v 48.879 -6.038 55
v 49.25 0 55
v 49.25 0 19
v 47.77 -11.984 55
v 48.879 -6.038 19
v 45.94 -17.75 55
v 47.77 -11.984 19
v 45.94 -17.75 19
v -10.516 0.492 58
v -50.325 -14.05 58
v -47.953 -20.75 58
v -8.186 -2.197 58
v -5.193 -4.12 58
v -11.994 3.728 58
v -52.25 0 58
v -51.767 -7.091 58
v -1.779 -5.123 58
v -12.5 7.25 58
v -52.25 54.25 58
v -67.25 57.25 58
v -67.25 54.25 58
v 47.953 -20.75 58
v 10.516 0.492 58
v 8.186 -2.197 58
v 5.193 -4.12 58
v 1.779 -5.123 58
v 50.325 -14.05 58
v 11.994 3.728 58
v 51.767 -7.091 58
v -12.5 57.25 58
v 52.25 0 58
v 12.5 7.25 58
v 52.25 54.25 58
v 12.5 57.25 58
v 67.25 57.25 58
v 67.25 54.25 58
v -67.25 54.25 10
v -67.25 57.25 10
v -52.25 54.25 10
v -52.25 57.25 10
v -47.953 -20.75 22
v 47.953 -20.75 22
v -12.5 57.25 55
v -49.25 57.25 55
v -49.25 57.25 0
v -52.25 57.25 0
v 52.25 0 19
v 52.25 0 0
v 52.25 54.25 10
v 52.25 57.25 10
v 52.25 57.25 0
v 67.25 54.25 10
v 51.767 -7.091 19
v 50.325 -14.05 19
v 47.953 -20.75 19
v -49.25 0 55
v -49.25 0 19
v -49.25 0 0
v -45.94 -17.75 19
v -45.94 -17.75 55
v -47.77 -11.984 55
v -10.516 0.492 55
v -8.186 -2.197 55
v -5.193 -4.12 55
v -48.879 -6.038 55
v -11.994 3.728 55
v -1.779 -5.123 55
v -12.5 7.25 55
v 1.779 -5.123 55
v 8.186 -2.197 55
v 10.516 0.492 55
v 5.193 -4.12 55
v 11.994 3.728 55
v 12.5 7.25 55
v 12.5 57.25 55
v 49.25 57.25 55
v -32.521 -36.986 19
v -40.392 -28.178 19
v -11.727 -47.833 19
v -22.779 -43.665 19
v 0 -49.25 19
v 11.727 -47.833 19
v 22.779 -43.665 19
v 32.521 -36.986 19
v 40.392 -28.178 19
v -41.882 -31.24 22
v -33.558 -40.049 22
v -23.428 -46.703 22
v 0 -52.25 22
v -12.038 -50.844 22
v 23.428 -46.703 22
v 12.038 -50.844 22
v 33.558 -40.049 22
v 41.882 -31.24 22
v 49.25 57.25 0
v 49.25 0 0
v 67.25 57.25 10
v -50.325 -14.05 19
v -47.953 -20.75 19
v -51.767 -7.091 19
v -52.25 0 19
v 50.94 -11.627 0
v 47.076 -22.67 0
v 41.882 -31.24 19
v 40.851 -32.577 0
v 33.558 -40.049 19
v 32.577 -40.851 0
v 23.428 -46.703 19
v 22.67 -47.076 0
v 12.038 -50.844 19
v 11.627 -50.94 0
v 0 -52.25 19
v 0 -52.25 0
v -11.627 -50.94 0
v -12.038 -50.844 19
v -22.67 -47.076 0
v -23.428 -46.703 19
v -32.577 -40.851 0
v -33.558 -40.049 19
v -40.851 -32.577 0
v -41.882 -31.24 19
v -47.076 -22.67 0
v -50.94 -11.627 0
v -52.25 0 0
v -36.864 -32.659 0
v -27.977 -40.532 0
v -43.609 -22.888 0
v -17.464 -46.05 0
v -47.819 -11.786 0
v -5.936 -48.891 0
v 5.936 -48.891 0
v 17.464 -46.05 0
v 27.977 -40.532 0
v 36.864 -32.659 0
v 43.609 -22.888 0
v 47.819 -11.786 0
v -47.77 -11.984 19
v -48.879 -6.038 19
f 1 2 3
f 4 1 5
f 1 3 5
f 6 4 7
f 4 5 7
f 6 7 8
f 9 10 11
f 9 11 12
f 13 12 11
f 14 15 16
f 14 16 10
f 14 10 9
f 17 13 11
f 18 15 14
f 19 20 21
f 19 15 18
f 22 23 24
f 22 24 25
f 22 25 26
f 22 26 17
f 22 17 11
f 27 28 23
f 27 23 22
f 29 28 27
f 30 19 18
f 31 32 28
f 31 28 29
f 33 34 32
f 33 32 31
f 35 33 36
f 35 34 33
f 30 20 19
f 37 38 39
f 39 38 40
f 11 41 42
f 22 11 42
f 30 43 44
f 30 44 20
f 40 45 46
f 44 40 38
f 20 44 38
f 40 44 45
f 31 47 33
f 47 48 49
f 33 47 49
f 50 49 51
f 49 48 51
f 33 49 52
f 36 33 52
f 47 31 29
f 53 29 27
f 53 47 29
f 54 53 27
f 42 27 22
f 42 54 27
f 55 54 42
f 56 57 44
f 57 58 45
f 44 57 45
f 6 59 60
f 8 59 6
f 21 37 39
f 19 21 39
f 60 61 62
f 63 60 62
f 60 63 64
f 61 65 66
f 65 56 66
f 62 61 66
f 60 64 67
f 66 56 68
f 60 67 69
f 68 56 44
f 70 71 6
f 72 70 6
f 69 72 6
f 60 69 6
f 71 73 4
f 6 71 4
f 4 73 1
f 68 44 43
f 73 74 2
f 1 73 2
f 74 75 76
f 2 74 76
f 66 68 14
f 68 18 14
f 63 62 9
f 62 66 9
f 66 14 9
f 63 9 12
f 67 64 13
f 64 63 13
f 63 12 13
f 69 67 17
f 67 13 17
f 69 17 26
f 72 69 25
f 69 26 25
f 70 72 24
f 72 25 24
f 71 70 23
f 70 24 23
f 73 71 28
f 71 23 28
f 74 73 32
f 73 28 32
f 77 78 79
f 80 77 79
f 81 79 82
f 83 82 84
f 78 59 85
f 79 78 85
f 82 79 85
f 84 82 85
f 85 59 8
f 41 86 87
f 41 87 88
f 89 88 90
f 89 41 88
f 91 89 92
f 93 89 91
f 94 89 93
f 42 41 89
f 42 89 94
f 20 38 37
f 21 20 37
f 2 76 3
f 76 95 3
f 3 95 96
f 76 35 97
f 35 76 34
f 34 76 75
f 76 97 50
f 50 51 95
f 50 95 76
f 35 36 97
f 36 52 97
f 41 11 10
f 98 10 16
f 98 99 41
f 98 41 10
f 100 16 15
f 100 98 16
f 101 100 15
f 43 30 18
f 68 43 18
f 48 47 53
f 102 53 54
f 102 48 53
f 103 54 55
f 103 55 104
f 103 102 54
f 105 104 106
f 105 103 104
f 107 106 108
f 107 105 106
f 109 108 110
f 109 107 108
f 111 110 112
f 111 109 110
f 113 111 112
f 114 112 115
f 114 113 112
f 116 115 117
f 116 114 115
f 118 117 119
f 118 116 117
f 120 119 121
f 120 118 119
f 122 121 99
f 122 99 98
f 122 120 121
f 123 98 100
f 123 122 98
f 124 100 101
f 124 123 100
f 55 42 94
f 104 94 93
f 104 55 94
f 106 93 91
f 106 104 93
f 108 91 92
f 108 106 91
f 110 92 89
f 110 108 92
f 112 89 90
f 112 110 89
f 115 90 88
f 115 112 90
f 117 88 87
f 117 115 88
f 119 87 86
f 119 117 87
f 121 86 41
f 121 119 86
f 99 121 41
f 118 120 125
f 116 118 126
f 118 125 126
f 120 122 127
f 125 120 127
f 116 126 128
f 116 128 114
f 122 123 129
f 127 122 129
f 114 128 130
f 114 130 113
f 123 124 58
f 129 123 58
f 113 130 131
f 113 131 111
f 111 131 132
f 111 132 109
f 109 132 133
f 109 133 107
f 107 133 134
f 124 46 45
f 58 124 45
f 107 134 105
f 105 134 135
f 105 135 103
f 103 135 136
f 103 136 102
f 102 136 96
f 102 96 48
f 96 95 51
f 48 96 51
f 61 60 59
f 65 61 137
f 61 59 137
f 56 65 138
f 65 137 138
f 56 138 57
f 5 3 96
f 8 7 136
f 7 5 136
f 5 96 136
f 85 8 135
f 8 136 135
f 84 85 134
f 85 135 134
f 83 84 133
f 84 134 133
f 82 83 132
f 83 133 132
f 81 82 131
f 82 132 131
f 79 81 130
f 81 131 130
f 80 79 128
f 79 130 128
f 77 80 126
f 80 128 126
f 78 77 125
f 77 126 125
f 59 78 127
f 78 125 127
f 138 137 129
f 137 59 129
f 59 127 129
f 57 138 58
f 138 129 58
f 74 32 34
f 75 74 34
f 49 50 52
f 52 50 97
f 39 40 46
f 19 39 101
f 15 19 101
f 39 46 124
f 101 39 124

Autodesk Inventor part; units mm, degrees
ref_plane "YZ Plane" through (0, 0, 0) normal (1, 0, 0) x (0, 1, 0)
ref_plane "XZ Plane" through (0, 0, 0) normal (0, 1, 0) x (-1, 0, 0)
ref_plane "XY Plane" through (0, 0, 0) normal (0, 0, 1) x (1, 0, 0)
sketch "Boceto1" plane through (0, 0, 0) normal (0, 0, 1) x (1, 0, 0)
  arc A0 (-52.25, 0) -> (52.25, 0) centre (0, 0) ccw
  line L0 (-52.25, 0) -> (-52.25, 57.25)
  line L1 (-52.25, 57.25) -> (-49.25, 57.25)
  line L2 (52.25, 57.25) -> (52.25, 0)
  arc A1 (52.25, 0) -> (-52.25, 0) centre (0, 0) ccw construction
  line L3 (0, -52.25) -> (0, 57.25) construction
  line L4 (-49.25, 57.25) -> (-49.25, 0)
  arc A2 (-49.25, 0) -> (49.25, 0) centre (0, 0) ccw
  line L5 (49.25, 0) -> (49.25, 57.25)
  line L6 (49.25, 57.25) -> (-49.25, 57.25) construction
  line L7 (49.25, 57.25) -> (49.25, 57.25)
  line L8 (-49.25, 57.25) -> (-49.25, 57.25)
  line L9 (-49.25, 57.25) -> (0, 57.25) construction
  line L10 (0, 57.25) -> (49.25, 57.25) construction
  line L11 (49.25, 57.25) -> (52.25, 57.25)
  dimension "d0" = 104.5
  dimension "d2" = 109.5
  dimension "d3" = 3
extrude "Extrusión1" add sketch "Boceto1" along normal blind 10
sketch "Boceto2" plane through (0, 0, 10) normal (0, 0, 1) x (1, 0, 0)
  line L0 (49.25, 57.25) -> (49.25, 0) projected
  arc A0 (-49.25, 0) -> (49.25, 0) centre (0, 0) ccw projected
  line L1 (-49.25, 0) -> (-49.25, 57.25) projected
  line L2 (-49.25, 57.25) -> (-52.25, 57.25) projected
  line L3 (-52.25, 57.25) -> (-52.25, 0) projected
  arc A1 (-52.25, 0) -> (52.25, 0) centre (0, 0) ccw projected
  line L4 (52.25, 0) -> (52.25, 57.25) projected
  line L5 (52.25, 57.25) -> (49.25, 57.25) projected
  line L6 (-49.25, 57.25) -> (-52.25, 57.25) projected
  line L7 (-52.25, 57.25) -> (-67.25, 57.25)
  line L8 (-67.25, 57.25) -> (-67.25, 54.25)
  line L9 (-67.25, 54.25) -> (-52.25, 54.25)
  line L10 (-52.25, 54.25) -> (-52.25, 57.25)
  line L11 (52.25, 57.25) -> (49.25, 57.25) projected
  line L12 (52.25, 57.25) -> (67.25, 57.25)
  line L13 (67.25, 57.25) -> (67.25, 54.25)
  line L14 (67.25, 54.25) -> (52.25, 54.25)
  line L15 (52.25, 54.25) -> (52.25, 57.25)
  point P0 (49.5, 57.5)
  dimension "d6" = 15
  dimension "d7" = 3
  dimension "d8" = 15
  dimension "d9" = 3
extrude "Extrusión3" add sketch "Boceto2" along normal blind 9
sketch "Boceto3" plane through (0, 0, 19) normal (0, 0, 1) x (1, 0, 0)
  line L0 (-52.25, 54.25) -> (-52.25, 0) projected
  line L1 (-49.25, 0) -> (-49.25, 57.25) projected
  line L2 (-49.25, 57.25) -> (-67.25, 57.25) projected
  line L3 (-67.25, 54.25) -> (-52.25, 54.25) projected
  line L4 (-67.25, 57.25) -> (-67.25, 54.25) projected
  line L5 (49.25, 57.25) -> (49.25, 0) projected
  line L6 (52.25, 0) -> (52.25, 54.25) projected
  line L7 (52.25, 54.25) -> (67.25, 54.25) projected
  line L8 (67.25, 54.25) -> (67.25, 57.25) projected
  line L9 (67.25, 57.25) -> (49.25, 57.25) projected
  arc A0 (-52.25, 0) -> (52.25, 0) centre (0, 0) ccw construction
  line L10 (-47.9531, -20.75) -> (47.9531, -20.75)
  arc A1 (-52.25, 0) -> (-47.9531, -20.75) centre (0, 0) ccw
  arc A2 (47.9531, -20.75) -> (52.25, 0) centre (0, 0) ccw
  arc A3 (-49.25, 0) -> (-45.9402, -17.75) centre (0, 0) ccw
  arc A4 (44.6654, -20.75) -> (45.9402, -17.75) centre (0, 0) ccw construction
  line L11 (-49.1426, -17.75) -> (-45.9402, -17.75) construction
  arc A5 (-45.9402, -17.75) -> (-44.6654, -20.75) centre (0, 0) ccw construction
  line L12 (-45.9402, -17.75) -> (45.9402, -17.75)
  arc A6 (45.9402, -17.75) -> (49.25, 0) centre (0, 0) ccw
  line L13 (45.9402, -17.75) -> (49.1426, -17.75) construction
  dimension "d14" = 78
  dimension "d15" = 3
extrude "Extrusión4" add sketch "Boceto3" along normal blind 39
sketch "Boceto4" plane through (0, 0, 19) normal (0, 0, 1) x (1, 0, 0)
  arc A0 (-47.9531, -20.75) -> (47.9531, -20.75) centre (0, 0) ccw projected
  line L0 (-47.9531, -20.75) -> (47.9531, -20.75) projected
extrude "Extrusión5" add sketch "Boceto4" along normal blind 3
sketch "Boceto5" plane through (0, 0, 58) normal (0, 0, 1) x (1, 0, 0)
  line L0 (-52.25, 54.25) -> (-52.25, 0) projected
  arc A0 (-52.25, 0) -> (-47.9531, -20.75) centre (0, 0) ccw projected
  line L1 (-47.9531, -20.75) -> (47.9531, -20.75) projected
  arc A1 (47.9531, -20.75) -> (52.25, 0) centre (0, 0) ccw projected
  line L2 (52.25, 0) -> (52.25, 54.25) projected
  line L3 (-52.25, 57.25) -> (-52.25, 0) projected
  line L4 (-52.25, 54.25) -> (-52.25, 57.25)
  line L5 (-52.25, 57.25) -> (-12.5, 57.25)
  line L6 (-12.5, 57.25) -> (-12.5, 7.25)
  line L7 (0, -5.25) -> (0, -5.25)
  line L8 (12.5, 7.25) -> (12.5, 57.25)
  line L9 (12.5, 57.25) -> (52.25, 57.25)
  line L10 (52.25, 57.25) -> (52.25, 54.25)
  arc A2 (-12.5, 7.25) -> (0, -5.25) centre (0, 7.25) ccw
  arc A3 (0, -5.25) -> (12.5, 7.25) centre (0, 7.25) ccw
  point P0 (-12.5, -5.25)
  point P1 (12.5, -5.25)
  point P2 (0, -5.25)
  dimension "d20" = 25
  dimension "d22" = 12.5
  dimension "d23" = 12.5
  dimension "d24" = 50
extrude "Extrusión6" add sketch "Boceto5" against normal blind 3
properties part number "_3DPrint"
